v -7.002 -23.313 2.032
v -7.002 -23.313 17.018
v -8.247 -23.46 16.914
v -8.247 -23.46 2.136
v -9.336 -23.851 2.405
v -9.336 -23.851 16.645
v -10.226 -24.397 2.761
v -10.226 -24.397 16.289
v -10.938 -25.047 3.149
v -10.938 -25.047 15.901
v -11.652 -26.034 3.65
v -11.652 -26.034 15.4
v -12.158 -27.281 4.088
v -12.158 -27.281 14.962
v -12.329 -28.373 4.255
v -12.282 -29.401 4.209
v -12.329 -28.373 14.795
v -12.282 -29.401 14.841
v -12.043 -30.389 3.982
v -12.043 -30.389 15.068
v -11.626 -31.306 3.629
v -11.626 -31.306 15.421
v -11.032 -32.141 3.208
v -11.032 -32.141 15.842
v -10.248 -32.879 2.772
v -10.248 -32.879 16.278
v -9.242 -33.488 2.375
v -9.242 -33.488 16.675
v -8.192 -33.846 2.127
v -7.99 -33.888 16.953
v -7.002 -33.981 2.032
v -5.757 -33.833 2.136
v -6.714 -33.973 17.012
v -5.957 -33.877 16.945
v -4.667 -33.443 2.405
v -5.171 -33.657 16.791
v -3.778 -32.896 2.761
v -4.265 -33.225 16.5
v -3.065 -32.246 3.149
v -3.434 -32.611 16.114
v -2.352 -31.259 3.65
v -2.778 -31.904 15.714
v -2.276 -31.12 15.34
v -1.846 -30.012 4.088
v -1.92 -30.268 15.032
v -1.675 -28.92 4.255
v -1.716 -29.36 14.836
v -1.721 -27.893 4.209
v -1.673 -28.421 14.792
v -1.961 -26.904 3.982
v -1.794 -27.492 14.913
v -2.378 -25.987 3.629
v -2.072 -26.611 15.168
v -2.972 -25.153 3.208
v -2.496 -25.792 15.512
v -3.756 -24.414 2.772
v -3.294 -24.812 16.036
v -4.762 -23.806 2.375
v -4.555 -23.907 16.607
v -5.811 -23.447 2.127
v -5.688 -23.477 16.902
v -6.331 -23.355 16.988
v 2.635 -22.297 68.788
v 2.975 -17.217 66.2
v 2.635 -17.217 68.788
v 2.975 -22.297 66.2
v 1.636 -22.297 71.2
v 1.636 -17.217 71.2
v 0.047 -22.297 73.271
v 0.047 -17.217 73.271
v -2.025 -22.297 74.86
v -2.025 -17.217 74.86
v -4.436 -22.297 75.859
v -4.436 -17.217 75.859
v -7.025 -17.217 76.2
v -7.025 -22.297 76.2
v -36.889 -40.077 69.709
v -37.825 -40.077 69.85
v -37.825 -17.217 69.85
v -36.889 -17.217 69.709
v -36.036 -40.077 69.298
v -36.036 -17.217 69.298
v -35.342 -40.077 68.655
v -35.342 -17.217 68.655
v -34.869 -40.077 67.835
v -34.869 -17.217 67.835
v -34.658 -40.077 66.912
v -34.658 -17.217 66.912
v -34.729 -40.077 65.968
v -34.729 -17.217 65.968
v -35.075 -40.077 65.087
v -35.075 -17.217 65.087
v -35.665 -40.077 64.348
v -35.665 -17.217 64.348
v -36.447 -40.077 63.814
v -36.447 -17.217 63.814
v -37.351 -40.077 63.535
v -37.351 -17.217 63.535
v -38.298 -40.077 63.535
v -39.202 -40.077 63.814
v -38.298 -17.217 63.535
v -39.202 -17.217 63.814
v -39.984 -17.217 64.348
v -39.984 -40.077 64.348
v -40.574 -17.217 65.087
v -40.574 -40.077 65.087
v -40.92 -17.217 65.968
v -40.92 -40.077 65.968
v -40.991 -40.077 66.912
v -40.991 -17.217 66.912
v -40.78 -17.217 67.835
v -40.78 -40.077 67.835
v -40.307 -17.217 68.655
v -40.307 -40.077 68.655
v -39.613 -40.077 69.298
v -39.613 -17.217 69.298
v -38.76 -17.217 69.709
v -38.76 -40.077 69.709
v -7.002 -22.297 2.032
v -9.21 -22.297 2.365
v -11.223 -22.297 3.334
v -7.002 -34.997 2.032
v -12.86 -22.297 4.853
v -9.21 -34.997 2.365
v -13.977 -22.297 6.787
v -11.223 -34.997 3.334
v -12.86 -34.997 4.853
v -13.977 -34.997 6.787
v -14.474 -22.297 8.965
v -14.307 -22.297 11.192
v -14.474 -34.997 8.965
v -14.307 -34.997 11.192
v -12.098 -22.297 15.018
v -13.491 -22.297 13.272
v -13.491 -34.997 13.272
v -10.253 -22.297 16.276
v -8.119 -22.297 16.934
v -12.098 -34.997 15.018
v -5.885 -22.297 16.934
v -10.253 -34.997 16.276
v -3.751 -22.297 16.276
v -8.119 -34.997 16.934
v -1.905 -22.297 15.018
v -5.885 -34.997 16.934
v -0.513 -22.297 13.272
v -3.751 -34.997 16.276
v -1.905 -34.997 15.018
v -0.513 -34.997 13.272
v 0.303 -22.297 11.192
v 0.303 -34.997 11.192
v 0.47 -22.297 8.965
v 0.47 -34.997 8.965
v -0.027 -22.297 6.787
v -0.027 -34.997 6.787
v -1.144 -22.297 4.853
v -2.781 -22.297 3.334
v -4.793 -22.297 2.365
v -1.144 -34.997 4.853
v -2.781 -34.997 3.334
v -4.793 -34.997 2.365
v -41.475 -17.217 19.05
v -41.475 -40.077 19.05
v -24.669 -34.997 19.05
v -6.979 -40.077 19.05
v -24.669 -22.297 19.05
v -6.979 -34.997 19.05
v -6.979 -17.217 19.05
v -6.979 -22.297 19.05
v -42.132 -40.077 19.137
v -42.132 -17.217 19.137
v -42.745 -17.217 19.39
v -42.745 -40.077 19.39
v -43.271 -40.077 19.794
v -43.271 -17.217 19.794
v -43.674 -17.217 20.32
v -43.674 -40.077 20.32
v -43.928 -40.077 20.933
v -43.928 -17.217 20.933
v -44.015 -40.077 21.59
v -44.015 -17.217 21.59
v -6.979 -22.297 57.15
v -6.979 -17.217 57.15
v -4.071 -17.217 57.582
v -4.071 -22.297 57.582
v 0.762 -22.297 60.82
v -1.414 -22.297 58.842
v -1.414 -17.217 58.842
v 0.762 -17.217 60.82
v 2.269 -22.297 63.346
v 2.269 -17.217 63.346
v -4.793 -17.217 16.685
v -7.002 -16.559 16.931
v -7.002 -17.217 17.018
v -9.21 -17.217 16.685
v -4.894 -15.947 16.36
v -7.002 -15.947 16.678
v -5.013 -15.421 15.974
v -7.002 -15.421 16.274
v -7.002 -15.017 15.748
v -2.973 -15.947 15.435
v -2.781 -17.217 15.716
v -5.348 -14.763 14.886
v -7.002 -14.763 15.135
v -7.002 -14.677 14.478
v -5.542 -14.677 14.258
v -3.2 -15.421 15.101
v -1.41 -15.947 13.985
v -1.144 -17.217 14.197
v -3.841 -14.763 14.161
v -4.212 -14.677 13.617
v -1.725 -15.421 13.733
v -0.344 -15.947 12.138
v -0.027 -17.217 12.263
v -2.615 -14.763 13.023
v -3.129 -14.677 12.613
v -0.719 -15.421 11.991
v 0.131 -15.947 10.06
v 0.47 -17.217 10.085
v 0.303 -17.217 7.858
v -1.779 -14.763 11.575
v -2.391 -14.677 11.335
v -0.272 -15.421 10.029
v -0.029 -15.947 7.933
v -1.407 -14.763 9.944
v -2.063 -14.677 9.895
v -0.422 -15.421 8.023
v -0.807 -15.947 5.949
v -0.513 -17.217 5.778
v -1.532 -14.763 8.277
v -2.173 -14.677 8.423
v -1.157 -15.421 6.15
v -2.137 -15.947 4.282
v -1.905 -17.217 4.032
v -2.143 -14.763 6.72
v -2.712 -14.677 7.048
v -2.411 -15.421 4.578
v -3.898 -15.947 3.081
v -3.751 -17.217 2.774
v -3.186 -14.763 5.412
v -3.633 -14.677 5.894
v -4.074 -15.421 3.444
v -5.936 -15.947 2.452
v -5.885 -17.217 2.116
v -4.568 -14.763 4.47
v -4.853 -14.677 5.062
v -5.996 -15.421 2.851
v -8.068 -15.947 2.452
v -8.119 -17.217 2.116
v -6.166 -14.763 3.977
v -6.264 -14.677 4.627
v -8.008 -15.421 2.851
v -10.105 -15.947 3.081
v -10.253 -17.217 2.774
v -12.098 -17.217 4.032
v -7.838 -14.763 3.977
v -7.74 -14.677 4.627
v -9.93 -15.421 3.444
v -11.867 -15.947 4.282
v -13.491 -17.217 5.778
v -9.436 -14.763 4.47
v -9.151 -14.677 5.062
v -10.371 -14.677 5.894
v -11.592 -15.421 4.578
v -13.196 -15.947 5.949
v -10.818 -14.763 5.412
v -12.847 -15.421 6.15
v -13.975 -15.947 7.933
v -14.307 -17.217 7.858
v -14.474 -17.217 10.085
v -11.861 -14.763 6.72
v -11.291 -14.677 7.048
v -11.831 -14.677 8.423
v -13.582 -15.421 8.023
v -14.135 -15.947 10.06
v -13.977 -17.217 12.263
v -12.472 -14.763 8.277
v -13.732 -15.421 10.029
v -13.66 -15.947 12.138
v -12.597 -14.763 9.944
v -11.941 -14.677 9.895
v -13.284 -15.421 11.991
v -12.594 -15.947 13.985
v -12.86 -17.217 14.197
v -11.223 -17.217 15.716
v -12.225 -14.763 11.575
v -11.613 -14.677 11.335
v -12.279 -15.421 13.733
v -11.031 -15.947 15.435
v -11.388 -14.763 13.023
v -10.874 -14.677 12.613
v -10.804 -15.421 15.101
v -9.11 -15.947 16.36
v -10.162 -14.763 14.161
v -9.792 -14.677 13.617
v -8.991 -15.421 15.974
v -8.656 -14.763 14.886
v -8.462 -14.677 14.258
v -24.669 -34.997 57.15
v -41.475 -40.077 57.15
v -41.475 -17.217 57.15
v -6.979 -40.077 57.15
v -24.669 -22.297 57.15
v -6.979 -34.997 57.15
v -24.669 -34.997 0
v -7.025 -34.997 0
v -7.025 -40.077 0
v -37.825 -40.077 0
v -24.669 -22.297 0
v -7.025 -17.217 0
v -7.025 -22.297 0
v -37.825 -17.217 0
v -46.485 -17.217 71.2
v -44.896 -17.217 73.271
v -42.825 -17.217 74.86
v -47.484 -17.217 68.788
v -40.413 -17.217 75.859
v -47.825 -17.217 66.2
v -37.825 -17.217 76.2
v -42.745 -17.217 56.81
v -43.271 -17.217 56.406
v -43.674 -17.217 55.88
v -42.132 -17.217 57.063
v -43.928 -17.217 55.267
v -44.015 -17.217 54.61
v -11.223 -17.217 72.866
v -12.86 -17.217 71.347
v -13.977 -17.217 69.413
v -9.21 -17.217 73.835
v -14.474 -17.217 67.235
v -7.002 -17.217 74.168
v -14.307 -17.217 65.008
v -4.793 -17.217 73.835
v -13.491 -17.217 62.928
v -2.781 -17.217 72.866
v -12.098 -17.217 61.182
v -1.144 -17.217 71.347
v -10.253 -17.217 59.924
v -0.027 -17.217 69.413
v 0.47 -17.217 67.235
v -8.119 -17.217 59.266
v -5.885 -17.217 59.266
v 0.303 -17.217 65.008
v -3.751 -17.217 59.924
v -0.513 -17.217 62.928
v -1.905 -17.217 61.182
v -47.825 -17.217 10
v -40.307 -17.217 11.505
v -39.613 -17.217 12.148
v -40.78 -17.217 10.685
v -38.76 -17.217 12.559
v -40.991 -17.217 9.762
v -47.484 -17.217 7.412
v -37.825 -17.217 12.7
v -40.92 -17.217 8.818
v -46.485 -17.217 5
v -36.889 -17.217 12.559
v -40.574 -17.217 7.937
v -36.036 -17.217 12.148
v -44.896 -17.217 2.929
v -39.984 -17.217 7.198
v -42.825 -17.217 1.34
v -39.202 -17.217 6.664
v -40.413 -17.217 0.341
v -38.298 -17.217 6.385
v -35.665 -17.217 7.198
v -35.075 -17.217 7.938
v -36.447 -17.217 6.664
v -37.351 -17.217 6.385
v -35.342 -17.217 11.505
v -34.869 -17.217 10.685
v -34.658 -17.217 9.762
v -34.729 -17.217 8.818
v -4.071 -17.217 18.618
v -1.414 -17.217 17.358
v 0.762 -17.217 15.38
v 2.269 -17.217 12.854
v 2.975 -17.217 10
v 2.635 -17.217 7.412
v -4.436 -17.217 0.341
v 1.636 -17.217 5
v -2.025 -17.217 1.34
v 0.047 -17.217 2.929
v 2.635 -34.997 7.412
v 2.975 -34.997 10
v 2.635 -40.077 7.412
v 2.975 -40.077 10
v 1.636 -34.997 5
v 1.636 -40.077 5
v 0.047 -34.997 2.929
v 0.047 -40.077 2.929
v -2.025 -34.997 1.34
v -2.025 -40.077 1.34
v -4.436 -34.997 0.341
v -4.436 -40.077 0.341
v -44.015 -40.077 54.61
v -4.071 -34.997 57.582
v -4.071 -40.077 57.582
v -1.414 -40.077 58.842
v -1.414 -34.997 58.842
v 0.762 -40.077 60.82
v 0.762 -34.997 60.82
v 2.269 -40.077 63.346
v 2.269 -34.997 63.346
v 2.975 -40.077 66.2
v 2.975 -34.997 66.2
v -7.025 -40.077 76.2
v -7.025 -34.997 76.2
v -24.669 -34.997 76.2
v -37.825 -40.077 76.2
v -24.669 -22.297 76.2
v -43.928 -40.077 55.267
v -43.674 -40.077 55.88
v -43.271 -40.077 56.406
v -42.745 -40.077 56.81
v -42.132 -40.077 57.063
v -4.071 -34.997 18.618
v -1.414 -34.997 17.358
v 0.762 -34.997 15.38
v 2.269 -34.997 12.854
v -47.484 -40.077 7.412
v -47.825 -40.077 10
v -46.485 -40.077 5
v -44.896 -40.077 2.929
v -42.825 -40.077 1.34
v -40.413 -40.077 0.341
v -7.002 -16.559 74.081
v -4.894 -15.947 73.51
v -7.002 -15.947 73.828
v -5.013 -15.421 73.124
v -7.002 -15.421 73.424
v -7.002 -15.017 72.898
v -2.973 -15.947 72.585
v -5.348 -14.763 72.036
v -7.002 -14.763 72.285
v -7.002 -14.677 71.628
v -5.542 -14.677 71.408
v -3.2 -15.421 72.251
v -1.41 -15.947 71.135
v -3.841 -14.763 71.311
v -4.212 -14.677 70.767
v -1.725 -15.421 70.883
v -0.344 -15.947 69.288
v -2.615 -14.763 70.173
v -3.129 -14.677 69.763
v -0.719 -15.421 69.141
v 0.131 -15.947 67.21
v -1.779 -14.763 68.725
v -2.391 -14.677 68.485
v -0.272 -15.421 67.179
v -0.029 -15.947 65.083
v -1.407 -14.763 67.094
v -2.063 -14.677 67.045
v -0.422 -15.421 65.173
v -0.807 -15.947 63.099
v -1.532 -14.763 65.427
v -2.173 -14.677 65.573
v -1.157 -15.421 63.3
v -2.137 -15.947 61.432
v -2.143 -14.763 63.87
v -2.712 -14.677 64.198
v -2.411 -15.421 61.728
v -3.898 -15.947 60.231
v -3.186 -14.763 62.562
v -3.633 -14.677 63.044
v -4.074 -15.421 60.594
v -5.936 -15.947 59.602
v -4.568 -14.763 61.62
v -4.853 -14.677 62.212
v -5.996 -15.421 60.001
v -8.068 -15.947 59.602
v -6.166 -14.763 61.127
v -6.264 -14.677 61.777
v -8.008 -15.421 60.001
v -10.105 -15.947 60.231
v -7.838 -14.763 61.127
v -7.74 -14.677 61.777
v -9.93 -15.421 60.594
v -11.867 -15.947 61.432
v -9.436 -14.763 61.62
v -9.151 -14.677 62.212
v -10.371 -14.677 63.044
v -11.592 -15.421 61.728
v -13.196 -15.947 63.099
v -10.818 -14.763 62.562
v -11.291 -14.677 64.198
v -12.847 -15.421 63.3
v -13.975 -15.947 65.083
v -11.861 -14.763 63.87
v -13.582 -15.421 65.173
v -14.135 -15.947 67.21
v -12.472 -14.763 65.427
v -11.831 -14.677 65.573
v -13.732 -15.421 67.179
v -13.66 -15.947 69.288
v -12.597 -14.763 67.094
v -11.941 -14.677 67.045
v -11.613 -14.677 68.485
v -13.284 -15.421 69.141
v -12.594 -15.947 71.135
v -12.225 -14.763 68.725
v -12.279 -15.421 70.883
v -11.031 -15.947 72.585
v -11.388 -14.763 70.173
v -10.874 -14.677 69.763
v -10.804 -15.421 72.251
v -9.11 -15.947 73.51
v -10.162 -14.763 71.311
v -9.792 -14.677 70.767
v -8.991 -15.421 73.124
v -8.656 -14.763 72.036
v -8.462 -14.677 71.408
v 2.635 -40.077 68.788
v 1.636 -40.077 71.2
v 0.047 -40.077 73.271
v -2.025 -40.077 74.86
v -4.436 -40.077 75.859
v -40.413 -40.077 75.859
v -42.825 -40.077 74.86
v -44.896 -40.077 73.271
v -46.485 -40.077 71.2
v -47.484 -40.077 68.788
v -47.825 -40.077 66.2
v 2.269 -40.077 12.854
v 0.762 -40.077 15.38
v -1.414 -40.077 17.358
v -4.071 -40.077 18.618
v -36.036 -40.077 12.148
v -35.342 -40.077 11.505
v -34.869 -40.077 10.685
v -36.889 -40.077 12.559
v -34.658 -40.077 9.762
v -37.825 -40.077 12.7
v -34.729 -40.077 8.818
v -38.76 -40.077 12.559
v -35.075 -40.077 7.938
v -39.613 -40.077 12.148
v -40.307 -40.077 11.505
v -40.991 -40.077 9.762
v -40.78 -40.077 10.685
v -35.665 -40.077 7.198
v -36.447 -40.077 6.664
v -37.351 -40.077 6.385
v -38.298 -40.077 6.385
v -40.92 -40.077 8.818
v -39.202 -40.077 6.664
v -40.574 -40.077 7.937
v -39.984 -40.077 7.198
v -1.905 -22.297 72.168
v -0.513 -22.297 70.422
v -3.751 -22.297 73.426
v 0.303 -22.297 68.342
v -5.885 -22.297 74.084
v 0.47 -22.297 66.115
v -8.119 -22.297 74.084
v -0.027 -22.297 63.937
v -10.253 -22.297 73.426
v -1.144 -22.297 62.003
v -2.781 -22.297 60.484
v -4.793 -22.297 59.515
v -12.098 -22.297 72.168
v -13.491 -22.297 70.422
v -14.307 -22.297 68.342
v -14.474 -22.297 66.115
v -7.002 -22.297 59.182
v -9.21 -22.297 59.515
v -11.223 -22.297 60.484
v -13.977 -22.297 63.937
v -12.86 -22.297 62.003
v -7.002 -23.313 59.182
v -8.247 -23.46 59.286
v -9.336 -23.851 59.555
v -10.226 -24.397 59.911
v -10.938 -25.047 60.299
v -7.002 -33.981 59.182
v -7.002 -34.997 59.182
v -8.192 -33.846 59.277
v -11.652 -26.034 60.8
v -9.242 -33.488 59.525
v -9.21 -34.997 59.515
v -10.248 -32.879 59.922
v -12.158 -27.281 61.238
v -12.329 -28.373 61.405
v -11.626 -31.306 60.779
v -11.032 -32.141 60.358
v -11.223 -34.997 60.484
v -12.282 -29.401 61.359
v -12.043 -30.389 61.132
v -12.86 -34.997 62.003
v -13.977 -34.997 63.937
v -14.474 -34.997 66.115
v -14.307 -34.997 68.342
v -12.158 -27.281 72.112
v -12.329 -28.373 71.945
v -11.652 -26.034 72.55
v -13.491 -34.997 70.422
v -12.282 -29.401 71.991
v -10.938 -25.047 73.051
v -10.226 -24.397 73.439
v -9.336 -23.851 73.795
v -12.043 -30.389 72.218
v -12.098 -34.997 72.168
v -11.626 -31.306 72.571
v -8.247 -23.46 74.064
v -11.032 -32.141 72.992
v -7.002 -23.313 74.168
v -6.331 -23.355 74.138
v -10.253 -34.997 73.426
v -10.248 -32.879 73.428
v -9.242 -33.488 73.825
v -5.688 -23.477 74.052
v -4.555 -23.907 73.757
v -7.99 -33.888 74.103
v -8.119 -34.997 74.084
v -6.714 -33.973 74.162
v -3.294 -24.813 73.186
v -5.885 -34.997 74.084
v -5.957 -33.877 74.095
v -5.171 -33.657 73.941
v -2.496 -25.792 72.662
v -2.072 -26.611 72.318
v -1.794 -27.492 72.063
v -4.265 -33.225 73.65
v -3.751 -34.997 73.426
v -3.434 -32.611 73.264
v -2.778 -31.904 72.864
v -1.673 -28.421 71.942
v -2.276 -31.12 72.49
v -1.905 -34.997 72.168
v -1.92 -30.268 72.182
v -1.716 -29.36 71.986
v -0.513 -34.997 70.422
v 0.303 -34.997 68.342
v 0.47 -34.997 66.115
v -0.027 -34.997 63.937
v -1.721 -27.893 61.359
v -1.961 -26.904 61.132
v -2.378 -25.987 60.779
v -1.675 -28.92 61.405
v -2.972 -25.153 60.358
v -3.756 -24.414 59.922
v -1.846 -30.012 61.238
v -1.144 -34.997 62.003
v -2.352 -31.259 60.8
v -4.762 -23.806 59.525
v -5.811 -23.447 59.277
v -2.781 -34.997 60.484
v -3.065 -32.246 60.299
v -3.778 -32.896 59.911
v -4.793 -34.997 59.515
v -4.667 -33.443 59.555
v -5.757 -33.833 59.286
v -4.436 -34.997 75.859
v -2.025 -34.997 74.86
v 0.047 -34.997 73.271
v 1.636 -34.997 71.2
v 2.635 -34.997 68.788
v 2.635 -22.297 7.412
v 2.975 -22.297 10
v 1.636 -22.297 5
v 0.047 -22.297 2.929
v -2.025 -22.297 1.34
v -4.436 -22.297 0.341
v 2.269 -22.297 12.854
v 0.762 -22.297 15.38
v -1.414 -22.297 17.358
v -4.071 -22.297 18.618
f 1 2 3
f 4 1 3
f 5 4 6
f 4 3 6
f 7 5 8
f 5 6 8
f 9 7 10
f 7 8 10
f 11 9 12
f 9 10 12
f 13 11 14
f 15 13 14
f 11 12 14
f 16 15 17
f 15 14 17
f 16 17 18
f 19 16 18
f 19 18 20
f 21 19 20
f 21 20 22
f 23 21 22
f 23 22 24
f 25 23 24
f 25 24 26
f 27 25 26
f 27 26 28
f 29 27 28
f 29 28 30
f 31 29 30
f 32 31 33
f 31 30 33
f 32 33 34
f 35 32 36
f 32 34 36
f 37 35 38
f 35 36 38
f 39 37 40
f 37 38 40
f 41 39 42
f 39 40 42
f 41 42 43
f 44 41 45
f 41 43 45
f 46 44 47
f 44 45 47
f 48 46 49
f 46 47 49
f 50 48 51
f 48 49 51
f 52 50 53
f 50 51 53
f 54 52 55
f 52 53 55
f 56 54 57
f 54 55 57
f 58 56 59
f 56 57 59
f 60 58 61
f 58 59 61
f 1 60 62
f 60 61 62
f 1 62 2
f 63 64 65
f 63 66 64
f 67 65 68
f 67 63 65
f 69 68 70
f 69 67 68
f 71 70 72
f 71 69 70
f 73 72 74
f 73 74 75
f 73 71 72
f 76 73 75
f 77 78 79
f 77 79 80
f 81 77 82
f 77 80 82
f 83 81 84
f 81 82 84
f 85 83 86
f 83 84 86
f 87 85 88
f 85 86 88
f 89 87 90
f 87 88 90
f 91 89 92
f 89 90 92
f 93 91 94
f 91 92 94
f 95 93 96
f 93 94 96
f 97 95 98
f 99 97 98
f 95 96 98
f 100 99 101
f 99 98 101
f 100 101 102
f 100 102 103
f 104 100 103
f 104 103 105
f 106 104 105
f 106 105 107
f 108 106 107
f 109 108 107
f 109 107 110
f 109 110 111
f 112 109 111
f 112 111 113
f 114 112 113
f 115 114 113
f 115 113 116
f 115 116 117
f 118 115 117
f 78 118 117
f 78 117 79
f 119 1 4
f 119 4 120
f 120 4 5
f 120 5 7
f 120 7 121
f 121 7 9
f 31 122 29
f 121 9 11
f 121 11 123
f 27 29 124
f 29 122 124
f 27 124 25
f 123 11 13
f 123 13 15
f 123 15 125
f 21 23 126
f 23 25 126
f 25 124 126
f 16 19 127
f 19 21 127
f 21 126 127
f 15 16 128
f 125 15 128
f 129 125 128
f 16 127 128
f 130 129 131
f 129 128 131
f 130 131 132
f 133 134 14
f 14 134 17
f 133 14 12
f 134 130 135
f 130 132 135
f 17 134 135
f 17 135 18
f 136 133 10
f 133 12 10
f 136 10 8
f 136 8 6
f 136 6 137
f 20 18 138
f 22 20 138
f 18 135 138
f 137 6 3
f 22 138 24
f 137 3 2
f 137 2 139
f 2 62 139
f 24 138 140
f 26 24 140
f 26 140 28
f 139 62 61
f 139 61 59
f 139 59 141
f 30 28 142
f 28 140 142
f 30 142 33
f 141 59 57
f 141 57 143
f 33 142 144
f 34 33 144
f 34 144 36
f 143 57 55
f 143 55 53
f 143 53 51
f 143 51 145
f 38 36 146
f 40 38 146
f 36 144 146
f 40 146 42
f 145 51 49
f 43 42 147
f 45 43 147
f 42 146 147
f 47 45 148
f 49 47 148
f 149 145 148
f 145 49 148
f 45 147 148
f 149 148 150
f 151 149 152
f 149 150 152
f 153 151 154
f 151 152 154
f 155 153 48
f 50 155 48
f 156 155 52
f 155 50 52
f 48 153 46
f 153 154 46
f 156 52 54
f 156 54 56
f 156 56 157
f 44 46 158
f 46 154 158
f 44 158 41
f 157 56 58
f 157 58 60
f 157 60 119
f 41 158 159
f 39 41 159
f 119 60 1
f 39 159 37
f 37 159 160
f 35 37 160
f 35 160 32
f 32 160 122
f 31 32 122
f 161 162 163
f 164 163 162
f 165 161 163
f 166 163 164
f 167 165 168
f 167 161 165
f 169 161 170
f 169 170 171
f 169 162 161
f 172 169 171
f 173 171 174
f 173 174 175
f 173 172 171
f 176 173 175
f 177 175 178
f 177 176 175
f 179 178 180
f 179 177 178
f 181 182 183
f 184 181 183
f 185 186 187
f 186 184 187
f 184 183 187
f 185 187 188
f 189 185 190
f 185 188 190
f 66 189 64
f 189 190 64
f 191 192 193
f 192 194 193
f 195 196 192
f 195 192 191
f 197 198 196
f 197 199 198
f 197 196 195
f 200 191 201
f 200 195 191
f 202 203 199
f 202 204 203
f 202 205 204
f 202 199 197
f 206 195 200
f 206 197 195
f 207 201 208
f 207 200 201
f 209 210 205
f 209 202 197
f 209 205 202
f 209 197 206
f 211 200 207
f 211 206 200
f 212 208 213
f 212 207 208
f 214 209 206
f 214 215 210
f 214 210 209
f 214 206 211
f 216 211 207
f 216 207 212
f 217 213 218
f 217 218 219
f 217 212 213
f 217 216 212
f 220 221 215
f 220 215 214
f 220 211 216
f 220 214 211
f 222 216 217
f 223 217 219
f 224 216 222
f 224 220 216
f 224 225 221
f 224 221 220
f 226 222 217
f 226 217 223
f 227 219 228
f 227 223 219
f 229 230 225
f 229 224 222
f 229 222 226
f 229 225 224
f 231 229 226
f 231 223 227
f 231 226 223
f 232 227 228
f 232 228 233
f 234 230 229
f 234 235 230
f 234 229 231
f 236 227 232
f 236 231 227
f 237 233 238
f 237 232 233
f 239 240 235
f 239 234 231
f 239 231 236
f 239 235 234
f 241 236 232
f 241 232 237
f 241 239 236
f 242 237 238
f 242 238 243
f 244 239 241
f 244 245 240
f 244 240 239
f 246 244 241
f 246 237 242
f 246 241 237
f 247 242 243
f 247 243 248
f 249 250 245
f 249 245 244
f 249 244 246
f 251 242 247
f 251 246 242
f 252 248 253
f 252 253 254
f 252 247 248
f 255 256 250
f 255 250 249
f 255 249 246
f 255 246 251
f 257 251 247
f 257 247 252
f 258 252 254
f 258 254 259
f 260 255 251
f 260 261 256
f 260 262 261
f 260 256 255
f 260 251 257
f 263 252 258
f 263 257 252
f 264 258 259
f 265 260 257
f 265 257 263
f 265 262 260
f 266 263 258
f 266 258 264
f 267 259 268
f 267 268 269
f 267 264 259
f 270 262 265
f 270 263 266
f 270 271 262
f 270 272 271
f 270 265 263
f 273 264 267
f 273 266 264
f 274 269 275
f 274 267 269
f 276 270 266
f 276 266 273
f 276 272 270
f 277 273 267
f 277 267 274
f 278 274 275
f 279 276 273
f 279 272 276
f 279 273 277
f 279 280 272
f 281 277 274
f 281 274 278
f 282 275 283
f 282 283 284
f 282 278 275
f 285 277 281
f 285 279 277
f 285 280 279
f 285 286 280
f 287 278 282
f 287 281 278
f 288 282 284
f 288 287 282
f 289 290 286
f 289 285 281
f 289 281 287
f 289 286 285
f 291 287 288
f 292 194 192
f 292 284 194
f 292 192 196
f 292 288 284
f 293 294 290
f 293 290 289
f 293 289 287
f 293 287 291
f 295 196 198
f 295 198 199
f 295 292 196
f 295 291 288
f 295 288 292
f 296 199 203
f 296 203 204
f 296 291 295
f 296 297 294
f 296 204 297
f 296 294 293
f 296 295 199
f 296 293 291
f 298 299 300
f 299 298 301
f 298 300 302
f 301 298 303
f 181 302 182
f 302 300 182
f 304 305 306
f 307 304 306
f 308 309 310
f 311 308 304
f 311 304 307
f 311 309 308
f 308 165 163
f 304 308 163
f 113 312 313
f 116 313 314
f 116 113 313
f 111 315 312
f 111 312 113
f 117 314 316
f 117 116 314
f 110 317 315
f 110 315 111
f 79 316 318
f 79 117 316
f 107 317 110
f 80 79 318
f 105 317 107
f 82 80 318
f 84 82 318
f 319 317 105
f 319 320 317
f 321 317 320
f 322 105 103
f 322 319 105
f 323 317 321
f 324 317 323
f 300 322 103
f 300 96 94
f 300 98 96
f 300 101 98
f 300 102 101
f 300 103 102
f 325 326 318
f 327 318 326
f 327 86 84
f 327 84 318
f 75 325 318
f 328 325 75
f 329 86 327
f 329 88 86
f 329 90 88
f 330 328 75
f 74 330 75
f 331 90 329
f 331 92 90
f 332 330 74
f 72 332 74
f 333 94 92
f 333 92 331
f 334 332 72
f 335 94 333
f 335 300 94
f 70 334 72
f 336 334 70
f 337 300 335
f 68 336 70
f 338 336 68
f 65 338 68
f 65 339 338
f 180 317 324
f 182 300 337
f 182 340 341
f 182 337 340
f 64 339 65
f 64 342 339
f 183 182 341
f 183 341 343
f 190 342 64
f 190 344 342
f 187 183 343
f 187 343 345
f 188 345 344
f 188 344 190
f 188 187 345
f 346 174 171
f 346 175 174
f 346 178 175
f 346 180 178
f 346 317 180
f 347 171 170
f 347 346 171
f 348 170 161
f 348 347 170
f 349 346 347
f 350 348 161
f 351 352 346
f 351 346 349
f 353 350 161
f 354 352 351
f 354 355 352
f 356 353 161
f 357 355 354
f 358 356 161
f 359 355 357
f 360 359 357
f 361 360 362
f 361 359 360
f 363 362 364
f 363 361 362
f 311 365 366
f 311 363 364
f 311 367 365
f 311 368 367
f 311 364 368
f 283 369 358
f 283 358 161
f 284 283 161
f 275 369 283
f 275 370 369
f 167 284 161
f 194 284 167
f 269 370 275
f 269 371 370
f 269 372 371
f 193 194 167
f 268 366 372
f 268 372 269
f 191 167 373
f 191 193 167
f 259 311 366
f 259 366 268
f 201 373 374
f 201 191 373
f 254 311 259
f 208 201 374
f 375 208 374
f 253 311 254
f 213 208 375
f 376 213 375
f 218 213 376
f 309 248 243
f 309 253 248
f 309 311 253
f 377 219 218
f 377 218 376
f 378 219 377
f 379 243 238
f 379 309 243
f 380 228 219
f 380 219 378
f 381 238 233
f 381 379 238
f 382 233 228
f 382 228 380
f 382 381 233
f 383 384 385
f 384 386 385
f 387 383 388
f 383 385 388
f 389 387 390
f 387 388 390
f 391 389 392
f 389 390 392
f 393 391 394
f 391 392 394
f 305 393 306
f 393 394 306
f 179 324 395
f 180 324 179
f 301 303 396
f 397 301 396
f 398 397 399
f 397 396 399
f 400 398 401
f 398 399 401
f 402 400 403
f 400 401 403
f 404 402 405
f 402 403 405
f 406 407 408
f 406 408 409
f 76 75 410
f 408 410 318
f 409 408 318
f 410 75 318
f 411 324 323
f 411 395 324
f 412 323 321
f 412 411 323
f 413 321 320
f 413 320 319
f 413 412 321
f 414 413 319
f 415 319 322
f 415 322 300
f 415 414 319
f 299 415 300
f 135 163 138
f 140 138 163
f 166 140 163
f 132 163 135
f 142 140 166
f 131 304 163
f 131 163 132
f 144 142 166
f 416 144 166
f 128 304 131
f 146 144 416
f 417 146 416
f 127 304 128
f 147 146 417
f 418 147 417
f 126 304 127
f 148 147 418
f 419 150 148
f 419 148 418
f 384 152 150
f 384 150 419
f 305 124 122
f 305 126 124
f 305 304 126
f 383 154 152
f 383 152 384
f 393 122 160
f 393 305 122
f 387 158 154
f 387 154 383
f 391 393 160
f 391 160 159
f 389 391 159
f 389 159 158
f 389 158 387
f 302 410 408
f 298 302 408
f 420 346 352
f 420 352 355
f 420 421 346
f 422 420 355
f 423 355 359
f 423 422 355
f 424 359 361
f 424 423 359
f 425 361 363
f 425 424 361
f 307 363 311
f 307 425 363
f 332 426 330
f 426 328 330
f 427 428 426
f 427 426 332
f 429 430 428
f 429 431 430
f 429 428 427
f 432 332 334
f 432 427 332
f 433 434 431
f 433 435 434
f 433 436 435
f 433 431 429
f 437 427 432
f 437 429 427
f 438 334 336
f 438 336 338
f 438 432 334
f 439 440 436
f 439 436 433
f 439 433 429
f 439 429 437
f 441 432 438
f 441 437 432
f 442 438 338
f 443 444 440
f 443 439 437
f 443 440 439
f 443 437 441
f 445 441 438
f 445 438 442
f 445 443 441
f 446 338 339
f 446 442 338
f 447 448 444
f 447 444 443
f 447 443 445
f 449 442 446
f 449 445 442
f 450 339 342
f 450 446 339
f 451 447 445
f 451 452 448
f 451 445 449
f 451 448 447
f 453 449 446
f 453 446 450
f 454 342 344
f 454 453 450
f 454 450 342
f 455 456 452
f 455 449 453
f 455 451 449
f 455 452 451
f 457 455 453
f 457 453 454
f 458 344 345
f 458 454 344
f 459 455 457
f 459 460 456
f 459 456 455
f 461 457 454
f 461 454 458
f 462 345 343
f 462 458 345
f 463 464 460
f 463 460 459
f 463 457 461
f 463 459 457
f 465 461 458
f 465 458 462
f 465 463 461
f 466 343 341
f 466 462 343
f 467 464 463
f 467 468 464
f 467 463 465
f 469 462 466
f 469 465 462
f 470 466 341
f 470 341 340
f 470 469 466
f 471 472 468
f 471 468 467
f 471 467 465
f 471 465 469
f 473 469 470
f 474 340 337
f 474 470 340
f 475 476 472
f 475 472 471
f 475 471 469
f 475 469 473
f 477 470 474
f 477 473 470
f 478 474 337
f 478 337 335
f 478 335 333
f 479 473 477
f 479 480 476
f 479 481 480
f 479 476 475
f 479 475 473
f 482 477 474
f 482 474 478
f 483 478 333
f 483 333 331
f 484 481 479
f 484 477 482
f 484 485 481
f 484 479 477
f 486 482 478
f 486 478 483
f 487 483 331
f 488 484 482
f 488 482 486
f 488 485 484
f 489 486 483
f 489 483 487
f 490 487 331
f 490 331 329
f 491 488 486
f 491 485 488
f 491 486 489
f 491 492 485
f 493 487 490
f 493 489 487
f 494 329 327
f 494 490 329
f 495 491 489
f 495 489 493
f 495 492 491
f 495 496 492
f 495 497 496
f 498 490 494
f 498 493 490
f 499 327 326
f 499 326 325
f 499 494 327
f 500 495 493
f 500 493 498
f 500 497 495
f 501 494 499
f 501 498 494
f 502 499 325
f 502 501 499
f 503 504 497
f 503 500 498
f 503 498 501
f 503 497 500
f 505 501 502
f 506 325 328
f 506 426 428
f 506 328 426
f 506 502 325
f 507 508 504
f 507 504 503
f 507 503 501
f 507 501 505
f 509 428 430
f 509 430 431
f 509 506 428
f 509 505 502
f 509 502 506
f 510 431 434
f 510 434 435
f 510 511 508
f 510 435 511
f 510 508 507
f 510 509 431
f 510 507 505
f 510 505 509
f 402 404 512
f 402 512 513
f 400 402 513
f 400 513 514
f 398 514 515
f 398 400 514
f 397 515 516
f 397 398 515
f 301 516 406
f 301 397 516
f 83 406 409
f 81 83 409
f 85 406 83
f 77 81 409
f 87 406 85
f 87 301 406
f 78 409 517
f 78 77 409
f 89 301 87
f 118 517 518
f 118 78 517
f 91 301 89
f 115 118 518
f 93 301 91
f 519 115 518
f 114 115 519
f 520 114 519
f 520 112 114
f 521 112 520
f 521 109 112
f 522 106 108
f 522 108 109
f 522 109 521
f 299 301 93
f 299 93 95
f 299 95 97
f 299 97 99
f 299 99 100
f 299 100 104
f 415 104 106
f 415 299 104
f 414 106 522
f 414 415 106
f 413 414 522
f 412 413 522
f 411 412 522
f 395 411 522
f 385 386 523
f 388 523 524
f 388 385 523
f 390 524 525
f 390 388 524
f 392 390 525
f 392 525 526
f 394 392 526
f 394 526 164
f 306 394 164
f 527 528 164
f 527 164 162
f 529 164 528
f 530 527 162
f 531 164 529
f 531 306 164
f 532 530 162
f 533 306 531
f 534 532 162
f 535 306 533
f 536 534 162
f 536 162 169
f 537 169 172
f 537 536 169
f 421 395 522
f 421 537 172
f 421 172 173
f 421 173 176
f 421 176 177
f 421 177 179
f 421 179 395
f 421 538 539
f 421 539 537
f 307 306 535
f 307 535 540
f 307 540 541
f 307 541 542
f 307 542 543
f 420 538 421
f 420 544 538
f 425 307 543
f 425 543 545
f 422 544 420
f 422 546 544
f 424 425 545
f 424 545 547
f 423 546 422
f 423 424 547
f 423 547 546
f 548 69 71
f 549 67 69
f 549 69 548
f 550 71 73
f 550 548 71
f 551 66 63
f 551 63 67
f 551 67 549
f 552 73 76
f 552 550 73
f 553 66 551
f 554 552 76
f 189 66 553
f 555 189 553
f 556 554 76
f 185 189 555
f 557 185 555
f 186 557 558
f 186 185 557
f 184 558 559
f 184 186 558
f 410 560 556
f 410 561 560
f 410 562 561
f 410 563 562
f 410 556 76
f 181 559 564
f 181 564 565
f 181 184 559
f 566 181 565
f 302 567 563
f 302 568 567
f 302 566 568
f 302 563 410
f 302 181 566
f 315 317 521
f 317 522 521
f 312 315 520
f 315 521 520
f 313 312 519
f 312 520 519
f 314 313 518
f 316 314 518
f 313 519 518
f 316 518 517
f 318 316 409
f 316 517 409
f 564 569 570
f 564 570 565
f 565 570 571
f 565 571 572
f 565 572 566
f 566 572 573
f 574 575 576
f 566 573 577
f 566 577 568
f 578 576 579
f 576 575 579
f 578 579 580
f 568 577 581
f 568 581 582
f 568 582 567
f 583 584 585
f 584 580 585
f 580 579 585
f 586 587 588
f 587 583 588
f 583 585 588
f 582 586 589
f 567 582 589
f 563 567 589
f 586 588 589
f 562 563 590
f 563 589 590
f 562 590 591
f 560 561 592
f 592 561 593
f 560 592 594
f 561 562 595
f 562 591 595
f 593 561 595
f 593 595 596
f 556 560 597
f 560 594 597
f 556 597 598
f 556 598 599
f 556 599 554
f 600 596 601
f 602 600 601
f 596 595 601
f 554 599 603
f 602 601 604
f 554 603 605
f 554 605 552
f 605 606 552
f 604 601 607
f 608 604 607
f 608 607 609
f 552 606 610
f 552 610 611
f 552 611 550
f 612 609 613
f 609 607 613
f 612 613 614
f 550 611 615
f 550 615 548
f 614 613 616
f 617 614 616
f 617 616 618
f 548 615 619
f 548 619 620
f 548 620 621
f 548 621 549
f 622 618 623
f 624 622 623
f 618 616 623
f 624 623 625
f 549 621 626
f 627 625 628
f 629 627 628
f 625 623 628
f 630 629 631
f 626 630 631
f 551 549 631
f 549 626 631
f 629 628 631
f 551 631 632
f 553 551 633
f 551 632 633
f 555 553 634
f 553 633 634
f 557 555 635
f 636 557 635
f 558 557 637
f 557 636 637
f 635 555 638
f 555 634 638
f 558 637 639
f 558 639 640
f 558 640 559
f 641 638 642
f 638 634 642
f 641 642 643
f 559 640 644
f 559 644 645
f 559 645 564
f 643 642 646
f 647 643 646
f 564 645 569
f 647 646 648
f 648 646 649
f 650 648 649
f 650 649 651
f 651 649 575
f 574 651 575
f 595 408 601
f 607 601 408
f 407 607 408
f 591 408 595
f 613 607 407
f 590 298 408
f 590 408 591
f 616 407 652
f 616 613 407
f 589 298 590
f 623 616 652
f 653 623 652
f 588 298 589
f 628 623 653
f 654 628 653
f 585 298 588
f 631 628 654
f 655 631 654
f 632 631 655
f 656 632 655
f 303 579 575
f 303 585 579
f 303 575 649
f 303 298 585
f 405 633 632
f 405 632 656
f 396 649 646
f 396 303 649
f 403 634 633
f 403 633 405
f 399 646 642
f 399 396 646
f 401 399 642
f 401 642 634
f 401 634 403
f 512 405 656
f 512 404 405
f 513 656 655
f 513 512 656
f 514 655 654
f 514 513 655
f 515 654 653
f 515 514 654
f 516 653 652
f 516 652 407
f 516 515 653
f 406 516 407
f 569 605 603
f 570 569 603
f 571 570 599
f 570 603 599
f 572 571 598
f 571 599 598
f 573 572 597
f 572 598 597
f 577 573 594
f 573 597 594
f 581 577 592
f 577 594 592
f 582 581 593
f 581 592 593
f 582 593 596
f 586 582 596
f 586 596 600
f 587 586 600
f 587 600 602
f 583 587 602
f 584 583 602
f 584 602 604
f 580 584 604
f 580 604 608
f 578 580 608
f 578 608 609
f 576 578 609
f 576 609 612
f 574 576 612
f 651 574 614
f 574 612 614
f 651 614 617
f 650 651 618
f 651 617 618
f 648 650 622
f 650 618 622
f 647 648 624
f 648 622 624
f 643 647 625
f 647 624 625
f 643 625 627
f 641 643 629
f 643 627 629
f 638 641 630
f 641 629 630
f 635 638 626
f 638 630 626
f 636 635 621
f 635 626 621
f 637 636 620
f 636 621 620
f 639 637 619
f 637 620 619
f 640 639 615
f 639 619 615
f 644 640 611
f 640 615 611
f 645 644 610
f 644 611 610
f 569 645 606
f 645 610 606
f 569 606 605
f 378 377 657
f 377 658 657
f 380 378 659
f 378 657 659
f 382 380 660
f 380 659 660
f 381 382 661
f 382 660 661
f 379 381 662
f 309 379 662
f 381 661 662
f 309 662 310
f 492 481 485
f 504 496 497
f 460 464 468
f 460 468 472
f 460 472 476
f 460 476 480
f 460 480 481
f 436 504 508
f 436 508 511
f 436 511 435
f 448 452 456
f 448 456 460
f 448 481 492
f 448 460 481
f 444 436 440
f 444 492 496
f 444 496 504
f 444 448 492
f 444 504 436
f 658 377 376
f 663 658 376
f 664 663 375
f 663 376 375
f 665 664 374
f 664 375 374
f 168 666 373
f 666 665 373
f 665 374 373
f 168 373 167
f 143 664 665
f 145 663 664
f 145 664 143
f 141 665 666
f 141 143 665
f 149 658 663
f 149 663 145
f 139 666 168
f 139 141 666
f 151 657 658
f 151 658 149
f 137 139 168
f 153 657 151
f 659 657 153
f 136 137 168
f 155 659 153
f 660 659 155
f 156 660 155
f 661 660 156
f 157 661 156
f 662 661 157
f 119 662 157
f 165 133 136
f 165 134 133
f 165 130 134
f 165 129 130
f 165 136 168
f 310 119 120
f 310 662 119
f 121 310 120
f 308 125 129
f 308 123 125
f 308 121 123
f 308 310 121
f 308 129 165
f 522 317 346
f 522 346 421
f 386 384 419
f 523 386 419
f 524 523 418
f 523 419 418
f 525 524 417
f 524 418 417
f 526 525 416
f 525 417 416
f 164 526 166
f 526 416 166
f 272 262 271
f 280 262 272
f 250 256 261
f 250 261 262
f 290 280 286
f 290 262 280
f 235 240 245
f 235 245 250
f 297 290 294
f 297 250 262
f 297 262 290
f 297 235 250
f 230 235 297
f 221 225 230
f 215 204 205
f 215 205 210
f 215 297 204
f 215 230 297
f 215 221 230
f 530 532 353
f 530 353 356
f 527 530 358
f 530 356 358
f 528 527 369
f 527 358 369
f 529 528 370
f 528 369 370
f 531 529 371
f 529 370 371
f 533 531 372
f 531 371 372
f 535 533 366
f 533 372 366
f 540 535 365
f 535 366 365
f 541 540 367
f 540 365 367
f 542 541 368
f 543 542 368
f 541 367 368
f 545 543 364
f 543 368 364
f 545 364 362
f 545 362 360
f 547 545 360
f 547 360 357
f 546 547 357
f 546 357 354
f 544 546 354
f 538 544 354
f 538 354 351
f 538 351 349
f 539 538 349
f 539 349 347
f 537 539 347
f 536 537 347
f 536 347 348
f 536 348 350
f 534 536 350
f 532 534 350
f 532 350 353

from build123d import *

# Parameters (mm, degrees)
BOSS_EXTRUDE4_DEPTH = 76.2
FILLET1_R           = 10
SKETCH8_W           = 46.99
SKETCH8_H           = 38.1
CUT_EXTRUDE2_DEPTH  = 25.4
FILLET2_R           = 10
SKETCH9_R           = 7.493
BOSS_EXTRUDE5_DEPTH = 2.54
FILLET4_R           = 2.54
BOSS_EXTRUDE6_REACH = 94.231
SKETCH10_R          = 7.493
SKETCH11_R          = 5.334
CUT_EXTRUDE3_DEPTH  = 76.2
FILLET5_R           = 2.54
CUT_EXTRUDE5_REACH  = 94.824
SKETCH14_R          = 3.175


# Some blends are built 0.0001 mm under size
with BuildPart() as part:
    # Sketch7 → Boss-Extrude4 (new body)
    with BuildSketch(Plane.XY):
        Polygon((-47.824509335, -17.216733289), (2.975490665, -17.216733289), (2.975490665, -22.296733289), (-24.669160498, -22.296733289), (-24.669160498, -34.996733289), (2.975490665, -34.996733289), (2.975490665, -40.076733289), (-47.824509335, -40.076733289), (-47.824509335, -34.996733289), (-47.824509335, -22.296733289), align=None)
    extrude(amount=BOSS_EXTRUDE4_DEPTH)

    # Fillet1
    fillet1_edges = [part.edges().sort_by_distance(p)[0] for p in [
        (2.975490665, -19.756733289, 0),
        (2.975490665, -37.536733289, 0),
        (-47.824509335, -28.646733289, 0),
        (2.975490665, -37.536733289, 76.2),
        (2.975490665, -19.756733289, 76.2),
        (-47.824509335, -28.646733289, 76.2),
    ]]
    fillet(fillet1_edges, radius=FILLET1_R)

    # Sketch8 → Cut-Extrude2 (cut)
    with BuildSketch(Plane(origin=(0, -17.216733289, 0), x_dir=(1, 0, 0), z_dir=(0, 1, 0))):
        with Locations((-20.519509335, -38.1)):
            Rectangle(SKETCH8_W, SKETCH8_H)
    extrude(amount=-CUT_EXTRUDE2_DEPTH, mode=Mode.SUBTRACT)

    # Fillet2
    # the kernel refuses this fillet: 10 mm, written as the material it takes off along each edge
    with BuildSketch(Plane(origin=(2.975490665, -10.109801477, 57.15), x_dir=(-1, 0, 0), z_dir=(0, -1, 0)), Plane(origin=(2.975490665, 7.670198523, 57.15), x_dir=(-1, 0, 0), z_dir=(0, -1, 0))) as fillet2_piece_1:
        with BuildLine():
            CenterArc((9.954772725, -10), FILLET2_R, 90, 84.548680188)
            Line((0, -9.05), (-0.199095454, -9.031))
            ThreePointArc((-0.199095454, -9.031), (-0.2, -4.525), (-0.2, 0))
            Line((-0.2, 0), (0, 0.2))
            Line((0, 0.2), (9.954772725, 0.2))
            Line((9.954772725, 0.2), (9.954772725, 0))
        make_face()
    extrude(amount=54.853863623, mode=Mode.SUBTRACT)
    with BuildSketch(Plane(origin=(2.975490665, -10.109801477, 19.05), x_dir=(-1, 0, 0), z_dir=(0, -1, 0))) as fillet2_piece_2:
        with BuildLine():
            CenterArc((9.954772725, 10), FILLET2_R, 185.451319812, 84.548680188)
            Line((0, 9.05), (-0.199095454, 9.031))
            ThreePointArc((-0.199095454, 9.031), (-0.2, 4.525), (-0.2, 0))
            Line((-0.2, 0), (0, -0.2))
            Line((0, -0.2), (9.954772725, -0.2))
            Line((9.954772725, -0.2), (9.954772725, 0))
        make_face()
    extrude(amount=54.853863623, mode=Mode.SUBTRACT)
    with BuildSketch(Plane(origin=(2.975490665, 7.670198523, 19.05), x_dir=(0, 0, -1), z_dir=(0, -1, 0))) as fillet2_piece_3:
        with BuildLine():
            CenterArc((10, -9.954772725), FILLET2_R, 95.451319812, 84.548680188)
            Line((0, -9.954772725), (-0.2, -9.954772725))
            Line((-0.2, -9.954772725), (-0.2, 0))
            Line((-0.2, 0), (0, 0.2))
            ThreePointArc((0, 0.2), (4.525, 0.2), (9.031, 0.199095454))
            Line((9.031, 0.199095454), (9.05, 0))
        make_face()
    extrude(amount=54.853863623, mode=Mode.SUBTRACT)

    # Sketch9 → Boss-Extrude5 (add)
    with BuildSketch(Plane(origin=(0, -17.216733289, 0), x_dir=(1, 0, 0), z_dir=(0, 1, 0))):
        with Locations(Location((-7.001895697, -66.675, 0), (0, 0, 270))):
            Circle(SKETCH9_R)
        with Locations(Location((-7.001895697, -9.525, 0), (0, 0, 270))):
            Circle(SKETCH9_R)
    extrude(amount=BOSS_EXTRUDE5_DEPTH)

    # Fillet4
    fillet4_edges = [part.edges().sort_by_distance(p)[0] for p in [
        (-7.001895697, -14.676733289, 59.182),
        (-7.001895697, -14.676733289, 2.032),
    ]]
    fillet(fillet4_edges, radius=FILLET4_R - 0.0001)  # a hair under: the kernel refuses the full size

    # Sketch10 → Boss-Extrude6 (add, up to next)
    with BuildSketch(Plane(origin=(0, -34.996733289, 0), x_dir=(1, 0, 0), z_dir=(0, 1, 0)), mode=Mode.PRIVATE) as boss_extrude6_sk1:
        with Locations(Location((-7.001895697, -66.675, 0), (0, 0, 90))):
            Circle(SKETCH10_R)
    boss_extrude6_tool1 = extrude(boss_extrude6_sk1.sketch, amount=BOSS_EXTRUDE6_REACH, mode=Mode.PRIVATE) - part.part
    # Sketch10 → Boss-Extrude6 (add, up to next)
    with BuildSketch(Plane(origin=(0, -34.996733289, 0), x_dir=(1, 0, 0), z_dir=(0, 1, 0)), mode=Mode.PRIVATE) as boss_extrude6_sk2:
        with Locations(Location((-7.001895697, -9.525, 0), (0, 0, 90))):
            Circle(SKETCH10_R)
    boss_extrude6_tool2 = extrude(boss_extrude6_sk2.sketch, amount=BOSS_EXTRUDE6_REACH, mode=Mode.PRIVATE) - part.part
    add(boss_extrude6_tool1.solids().sort_by_distance((-7.001896, -34.996733, 66.675))[0])
    add(boss_extrude6_tool2.solids().sort_by_distance((-7.001896, -34.996733, 9.525))[0])

    # Sketch11 → Cut-Extrude3 (cut)
    with BuildSketch(Plane.XY.offset(76.2)):
        with Locations(Location((-7.001895697, -28.646733289, 0), (0, 0, 90.00000003))):
            Circle(SKETCH11_R)
    extrude(amount=-CUT_EXTRUDE3_DEPTH, mode=Mode.SUBTRACT)

    # Fillet5
    fillet5_edges = [part.edges().sort_by_distance(p)[0] for p in [
        (-44.014509335, -28.646733289, 57.15),
        (-44.014509335, -28.646733289, 19.05),
    ]]
    fillet(fillet5_edges, radius=FILLET5_R)

    # Sketch14 → Cut-Extrude5 (cut, up to next)
    with BuildSketch(Plane(origin=(0, -17.216733289, 0), x_dir=(1, 0, 0), z_dir=(0, 1, 0)), mode=Mode.PRIVATE) as cut_extrude5_sk1:
        with Locations(Location((-37.824509335, -9.525, 0), (0, 0, 270))):
            Circle(SKETCH14_R)
    cut_extrude5_tool1 = extrude(cut_extrude5_sk1.sketch, amount=-CUT_EXTRUDE5_REACH, mode=Mode.PRIVATE) & part.part
    # Sketch14 → Cut-Extrude5 (cut, up to next)
    with BuildSketch(Plane(origin=(0, -17.216733289, 0), x_dir=(1, 0, 0), z_dir=(0, 1, 0)), mode=Mode.PRIVATE) as cut_extrude5_sk2:
        with Locations(Location((-37.824509335, -66.675, 0), (0, 0, 270))):
            Circle(SKETCH14_R)
    cut_extrude5_tool2 = extrude(cut_extrude5_sk2.sketch, amount=-CUT_EXTRUDE5_REACH, mode=Mode.PRIVATE) & part.part
    add(cut_extrude5_tool1.solids().sort_by_distance((-37.824509, -17.216733, 9.525))[0], mode=Mode.SUBTRACT)
    add(cut_extrude5_tool2.solids().sort_by_distance((-37.824509, -17.216733, 66.675))[0], mode=Mode.SUBTRACT)


solid = part.part
